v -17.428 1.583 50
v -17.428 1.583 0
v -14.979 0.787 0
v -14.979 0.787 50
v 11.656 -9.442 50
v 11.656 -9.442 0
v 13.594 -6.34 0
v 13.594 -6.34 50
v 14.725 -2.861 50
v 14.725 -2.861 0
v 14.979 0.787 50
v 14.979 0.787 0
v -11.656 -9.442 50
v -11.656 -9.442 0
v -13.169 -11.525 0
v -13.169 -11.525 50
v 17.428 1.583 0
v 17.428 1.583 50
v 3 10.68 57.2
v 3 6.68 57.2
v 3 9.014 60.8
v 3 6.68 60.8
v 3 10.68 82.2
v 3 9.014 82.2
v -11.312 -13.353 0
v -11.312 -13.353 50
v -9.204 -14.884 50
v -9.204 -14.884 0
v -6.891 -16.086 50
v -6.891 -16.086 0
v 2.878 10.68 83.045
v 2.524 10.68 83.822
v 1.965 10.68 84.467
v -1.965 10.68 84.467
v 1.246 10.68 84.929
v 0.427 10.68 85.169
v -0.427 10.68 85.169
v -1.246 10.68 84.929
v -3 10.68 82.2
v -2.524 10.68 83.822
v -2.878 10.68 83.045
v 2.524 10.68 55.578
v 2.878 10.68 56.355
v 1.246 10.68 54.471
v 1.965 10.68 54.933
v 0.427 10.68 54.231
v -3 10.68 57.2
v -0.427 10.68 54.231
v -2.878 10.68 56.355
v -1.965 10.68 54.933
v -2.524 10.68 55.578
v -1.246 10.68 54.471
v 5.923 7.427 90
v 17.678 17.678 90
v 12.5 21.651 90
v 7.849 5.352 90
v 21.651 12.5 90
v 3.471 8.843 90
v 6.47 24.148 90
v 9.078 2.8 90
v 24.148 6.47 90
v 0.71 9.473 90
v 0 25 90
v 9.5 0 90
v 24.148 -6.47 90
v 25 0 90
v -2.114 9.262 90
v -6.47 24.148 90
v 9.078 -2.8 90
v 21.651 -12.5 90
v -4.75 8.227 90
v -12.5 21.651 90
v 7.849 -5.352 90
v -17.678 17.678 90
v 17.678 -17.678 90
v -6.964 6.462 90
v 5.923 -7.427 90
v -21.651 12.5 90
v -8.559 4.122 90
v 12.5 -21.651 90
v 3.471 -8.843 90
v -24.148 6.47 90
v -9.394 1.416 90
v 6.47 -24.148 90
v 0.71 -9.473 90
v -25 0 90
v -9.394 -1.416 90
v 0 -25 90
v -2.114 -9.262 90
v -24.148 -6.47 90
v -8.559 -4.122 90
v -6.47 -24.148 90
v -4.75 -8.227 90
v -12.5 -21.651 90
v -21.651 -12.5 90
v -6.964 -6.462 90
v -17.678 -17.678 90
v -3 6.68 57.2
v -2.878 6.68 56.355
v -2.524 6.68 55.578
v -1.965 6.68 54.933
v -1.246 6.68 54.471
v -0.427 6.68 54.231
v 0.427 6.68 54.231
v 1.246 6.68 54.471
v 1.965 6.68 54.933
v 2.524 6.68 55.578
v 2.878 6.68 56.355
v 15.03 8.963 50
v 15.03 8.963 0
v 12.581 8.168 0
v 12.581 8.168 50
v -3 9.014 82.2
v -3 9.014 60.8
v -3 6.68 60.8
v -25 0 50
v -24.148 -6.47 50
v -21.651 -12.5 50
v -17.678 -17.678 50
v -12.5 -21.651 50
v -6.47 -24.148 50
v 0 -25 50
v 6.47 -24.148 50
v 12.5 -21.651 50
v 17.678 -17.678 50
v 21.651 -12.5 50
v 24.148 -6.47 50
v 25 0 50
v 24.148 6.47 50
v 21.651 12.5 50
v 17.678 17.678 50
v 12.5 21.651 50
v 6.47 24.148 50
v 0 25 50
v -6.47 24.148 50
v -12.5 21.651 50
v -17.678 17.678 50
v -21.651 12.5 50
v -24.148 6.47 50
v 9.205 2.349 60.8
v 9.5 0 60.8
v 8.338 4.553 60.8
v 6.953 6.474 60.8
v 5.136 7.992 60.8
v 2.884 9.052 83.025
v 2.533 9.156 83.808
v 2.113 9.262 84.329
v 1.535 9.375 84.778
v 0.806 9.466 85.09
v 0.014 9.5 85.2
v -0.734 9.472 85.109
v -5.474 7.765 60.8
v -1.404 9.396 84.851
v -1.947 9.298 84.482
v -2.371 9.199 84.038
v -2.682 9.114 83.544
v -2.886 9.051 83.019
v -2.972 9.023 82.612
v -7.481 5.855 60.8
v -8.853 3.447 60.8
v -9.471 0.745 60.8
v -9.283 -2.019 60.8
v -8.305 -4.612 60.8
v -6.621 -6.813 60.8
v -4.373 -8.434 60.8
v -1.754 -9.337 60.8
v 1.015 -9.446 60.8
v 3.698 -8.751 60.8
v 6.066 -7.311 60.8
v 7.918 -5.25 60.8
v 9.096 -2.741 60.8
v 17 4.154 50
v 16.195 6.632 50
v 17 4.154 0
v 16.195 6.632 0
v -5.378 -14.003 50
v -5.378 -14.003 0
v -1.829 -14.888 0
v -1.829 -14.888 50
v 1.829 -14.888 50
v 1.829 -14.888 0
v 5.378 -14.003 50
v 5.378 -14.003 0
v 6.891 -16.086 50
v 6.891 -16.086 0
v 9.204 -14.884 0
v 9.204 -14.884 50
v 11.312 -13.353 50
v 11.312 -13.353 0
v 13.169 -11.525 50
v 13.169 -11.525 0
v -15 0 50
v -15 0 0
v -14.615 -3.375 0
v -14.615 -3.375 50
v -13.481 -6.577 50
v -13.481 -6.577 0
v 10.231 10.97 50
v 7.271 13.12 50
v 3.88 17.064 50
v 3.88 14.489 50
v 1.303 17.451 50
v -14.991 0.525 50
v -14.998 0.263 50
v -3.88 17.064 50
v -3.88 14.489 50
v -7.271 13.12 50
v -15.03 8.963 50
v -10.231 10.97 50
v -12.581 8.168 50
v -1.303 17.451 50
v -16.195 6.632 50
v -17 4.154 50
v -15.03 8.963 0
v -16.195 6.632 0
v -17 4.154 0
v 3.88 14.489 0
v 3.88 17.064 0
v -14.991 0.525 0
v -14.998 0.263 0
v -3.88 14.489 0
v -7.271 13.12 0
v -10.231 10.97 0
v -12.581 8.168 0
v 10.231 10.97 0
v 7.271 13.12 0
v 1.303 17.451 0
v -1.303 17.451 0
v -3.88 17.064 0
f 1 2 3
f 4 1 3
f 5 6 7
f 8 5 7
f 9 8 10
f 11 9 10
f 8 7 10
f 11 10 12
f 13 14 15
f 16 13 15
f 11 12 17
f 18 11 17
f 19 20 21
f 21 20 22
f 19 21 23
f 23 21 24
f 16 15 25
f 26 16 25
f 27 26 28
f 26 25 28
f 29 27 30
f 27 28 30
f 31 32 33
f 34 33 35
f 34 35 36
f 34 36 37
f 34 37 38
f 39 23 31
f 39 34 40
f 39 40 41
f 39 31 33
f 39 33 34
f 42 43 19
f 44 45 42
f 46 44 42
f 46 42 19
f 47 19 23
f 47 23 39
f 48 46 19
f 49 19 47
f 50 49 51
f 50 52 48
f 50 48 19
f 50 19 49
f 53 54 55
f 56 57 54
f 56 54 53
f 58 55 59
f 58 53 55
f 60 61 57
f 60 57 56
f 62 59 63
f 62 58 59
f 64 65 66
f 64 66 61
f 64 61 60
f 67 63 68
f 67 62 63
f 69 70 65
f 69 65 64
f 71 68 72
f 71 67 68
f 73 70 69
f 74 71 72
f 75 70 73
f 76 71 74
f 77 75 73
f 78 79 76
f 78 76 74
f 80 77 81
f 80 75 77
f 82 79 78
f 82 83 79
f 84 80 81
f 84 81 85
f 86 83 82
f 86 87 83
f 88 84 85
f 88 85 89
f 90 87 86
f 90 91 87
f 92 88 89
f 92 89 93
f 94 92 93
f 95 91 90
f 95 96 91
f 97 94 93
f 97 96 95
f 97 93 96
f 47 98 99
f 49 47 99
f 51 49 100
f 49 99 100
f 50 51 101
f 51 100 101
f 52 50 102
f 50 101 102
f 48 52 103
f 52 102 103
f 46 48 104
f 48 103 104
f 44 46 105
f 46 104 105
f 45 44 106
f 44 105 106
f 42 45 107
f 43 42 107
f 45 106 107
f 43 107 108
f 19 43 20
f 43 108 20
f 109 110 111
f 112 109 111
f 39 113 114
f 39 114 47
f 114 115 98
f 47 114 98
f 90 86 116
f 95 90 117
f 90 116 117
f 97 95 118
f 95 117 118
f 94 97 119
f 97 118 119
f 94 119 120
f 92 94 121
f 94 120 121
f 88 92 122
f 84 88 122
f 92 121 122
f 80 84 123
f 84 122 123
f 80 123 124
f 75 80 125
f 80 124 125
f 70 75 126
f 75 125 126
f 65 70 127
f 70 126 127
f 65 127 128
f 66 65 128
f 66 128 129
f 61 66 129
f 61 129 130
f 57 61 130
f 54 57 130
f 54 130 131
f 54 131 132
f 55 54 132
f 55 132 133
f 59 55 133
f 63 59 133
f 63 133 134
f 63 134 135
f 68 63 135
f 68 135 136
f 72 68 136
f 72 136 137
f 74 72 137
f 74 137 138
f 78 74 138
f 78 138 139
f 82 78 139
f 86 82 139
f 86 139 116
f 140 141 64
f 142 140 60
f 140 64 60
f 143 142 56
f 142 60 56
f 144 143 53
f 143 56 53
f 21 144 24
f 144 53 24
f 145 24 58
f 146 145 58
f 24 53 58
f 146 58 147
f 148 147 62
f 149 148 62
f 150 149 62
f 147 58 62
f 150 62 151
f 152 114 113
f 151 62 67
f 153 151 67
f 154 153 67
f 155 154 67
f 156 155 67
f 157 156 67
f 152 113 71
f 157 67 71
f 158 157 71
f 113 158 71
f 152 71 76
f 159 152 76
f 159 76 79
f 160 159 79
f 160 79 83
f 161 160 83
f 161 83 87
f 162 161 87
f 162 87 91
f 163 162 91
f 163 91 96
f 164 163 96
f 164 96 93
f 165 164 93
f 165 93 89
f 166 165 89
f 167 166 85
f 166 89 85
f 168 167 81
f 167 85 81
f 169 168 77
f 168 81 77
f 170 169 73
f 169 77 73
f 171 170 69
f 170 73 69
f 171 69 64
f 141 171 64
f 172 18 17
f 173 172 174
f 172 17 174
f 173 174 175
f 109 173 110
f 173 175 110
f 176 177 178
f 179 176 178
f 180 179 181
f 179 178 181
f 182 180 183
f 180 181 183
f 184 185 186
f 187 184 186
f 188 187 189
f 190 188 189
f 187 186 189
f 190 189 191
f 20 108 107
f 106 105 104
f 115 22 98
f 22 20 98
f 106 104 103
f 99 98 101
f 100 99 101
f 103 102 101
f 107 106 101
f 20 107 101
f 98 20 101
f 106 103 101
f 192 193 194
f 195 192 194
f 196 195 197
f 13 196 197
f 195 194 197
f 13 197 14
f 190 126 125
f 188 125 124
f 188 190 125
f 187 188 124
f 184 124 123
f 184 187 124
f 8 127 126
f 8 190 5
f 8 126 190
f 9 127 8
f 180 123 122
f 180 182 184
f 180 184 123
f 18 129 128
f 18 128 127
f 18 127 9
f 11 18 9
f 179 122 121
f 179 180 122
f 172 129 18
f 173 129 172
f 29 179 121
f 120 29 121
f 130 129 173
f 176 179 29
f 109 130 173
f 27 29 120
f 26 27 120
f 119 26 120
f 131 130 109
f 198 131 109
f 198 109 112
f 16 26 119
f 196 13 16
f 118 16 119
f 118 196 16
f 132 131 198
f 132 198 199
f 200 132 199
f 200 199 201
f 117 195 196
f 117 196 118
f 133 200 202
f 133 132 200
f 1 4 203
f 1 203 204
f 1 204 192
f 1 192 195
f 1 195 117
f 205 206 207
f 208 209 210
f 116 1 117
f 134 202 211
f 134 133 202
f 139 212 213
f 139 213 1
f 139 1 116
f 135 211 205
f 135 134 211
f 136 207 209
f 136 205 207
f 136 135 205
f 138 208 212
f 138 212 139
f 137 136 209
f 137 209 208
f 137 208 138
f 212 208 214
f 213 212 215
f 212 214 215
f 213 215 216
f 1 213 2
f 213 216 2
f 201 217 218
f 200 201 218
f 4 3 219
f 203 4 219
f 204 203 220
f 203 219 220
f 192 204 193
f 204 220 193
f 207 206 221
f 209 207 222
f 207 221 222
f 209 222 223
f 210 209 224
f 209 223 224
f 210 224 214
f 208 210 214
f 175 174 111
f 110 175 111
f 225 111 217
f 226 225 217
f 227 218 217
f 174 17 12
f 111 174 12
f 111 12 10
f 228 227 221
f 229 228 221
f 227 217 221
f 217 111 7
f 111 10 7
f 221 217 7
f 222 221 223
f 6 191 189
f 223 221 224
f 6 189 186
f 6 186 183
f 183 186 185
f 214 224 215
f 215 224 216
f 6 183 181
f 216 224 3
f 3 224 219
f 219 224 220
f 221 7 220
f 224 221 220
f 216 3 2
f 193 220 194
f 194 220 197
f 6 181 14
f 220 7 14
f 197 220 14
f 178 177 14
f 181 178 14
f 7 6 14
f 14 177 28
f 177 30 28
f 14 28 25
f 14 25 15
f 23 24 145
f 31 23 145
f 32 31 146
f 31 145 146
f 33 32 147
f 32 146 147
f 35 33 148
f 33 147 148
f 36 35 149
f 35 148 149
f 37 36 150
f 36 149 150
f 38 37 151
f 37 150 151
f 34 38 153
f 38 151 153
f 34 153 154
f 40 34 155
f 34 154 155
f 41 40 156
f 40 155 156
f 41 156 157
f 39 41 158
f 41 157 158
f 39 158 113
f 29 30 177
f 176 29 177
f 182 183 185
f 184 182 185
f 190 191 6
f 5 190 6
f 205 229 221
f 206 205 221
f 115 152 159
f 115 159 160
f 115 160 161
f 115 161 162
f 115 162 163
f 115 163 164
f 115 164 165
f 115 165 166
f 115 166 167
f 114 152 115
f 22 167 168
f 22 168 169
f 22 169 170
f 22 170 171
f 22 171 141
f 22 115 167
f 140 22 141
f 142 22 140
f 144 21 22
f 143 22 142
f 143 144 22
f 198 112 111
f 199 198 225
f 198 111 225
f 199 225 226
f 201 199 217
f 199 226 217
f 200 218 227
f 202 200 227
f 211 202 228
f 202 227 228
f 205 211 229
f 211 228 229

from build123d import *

# Parameters (mm, degrees)
SKETCH1_R           = 25
BOSS_EXTRUDE1_DEPTH = 90
SKETCH2_R           = 25
CUT_EXTRUDE2_DEPTH  = 50
CUT_EXTRUDE4_DEPTH  = 50
SKETCH3_R           = 9.5
CUT_EXTRUDE5_DEPTH  = 29.2
CUT_EXTRUDE6_DEPTH  = 4


with BuildPart() as part:
    # Sketch1 → Boss-Extrude1 (new body)
    with BuildSketch(Plane.XY):
        Circle(SKETCH1_R)
    extrude(amount=BOSS_EXTRUDE1_DEPTH)

    # Sketch2 → Cut-Extrude2 (cut)
    with BuildSketch(Plane(origin=(0, 0, 0), x_dir=(-1, 0, 0), z_dir=(0, 0, -1))):
        Circle(SKETCH2_R)
        with BuildLine():
            ThreePointArc((3.88, 17.064454284), (10.286241915, 14.157797402), (15.030274505, 8.963305657))
            ThreePointArc((15.030274505, 8.963305657), (16.643489035, 5.407797402), (17.428246382, 1.58310709))
            ThreePointArc((17.428246382, 1.58310709), (17.482052392, 0.792366178), (17.5, 0))
            ThreePointArc((17.5, 0), (16.381565231, -6.155836303), (13.169220505, -11.524826736))
            ThreePointArc((13.169220505, -11.524826736), (10.286241915, -14.157797402), (6.891248628, -16.086040294))
            ThreePointArc((6.891248628, -16.086040294), (0, -17.5), (-6.891248628, -16.086040294))
            ThreePointArc((-6.891248628, -16.086040294), (-10.286241915, -14.157797402), (-13.169220505, -11.524826736))
            ThreePointArc((-13.169220505, -11.524826736), (-16.643489035, -5.407797402), (-17.428246382, 1.58310709))
            ThreePointArc((-17.428246382, 1.58310709), (-16.643489035, 5.407797402), (-15.030274505, 8.963305657))
            ThreePointArc((-15.030274505, 8.963305657), (-10.286241915, 14.157797402), (-3.88, 17.064454284))
            ThreePointArc((-3.88, 17.064454284), (0, 17.5), (3.88, 17.064454284))
        make_face(mode=Mode.SUBTRACT)
    extrude(amount=-CUT_EXTRUDE2_DEPTH, mode=Mode.SUBTRACT)

    # Sketch2<3> → Cut-Extrude4 (cut)
    with BuildSketch(Plane(origin=(0, 0, 0), x_dir=(-1, 0, 0), z_dir=(0, 0, -1))):
        with BuildLine():
            ThreePointArc((3.88, 14.489499646), (8.816778784, 12.135254916), (12.581347118, 8.167600914))
            Line((12.581347118, 8.167600914), (15.030274505, 8.963305657))
            ThreePointArc((15.030274505, 8.963305657), (10.286241915, 14.157797402), (3.88, 17.064454284))
            Line((3.88, 17.064454284), (3.88, 14.489499646))
        make_face()
        with BuildLine():
            Line((17.428246382, 1.58310709), (14.979318995, 0.787402347))
            ThreePointArc((14.979318995, 0.787402347), (14.265847744, -4.635254916), (11.655700143, -9.441644675))
            Line((11.655700143, -9.441644675), (13.169220505, -11.524826736))
            ThreePointArc((13.169220505, -11.524826736), (16.643489035, -5.407797402), (17.428246382, 1.58310709))
        make_face()
        with BuildLine():
            Line((-3.88, 14.489499646), (-3.88, 17.064454284))
            ThreePointArc((-3.88, 17.064454284), (-10.286241915, 14.157797402), (-15.030274505, 8.963305657))
            Line((-15.030274505, 8.963305657), (-12.581347118, 8.167600914))
            ThreePointArc((-12.581347118, 8.167600914), (-8.816778784, 12.135254916), (-3.88, 14.489499646))
        make_face()
        with BuildLine():
            Line((6.891248628, -16.086040294), (5.377728267, -14.002858233))
            ThreePointArc((5.377728267, -14.002858233), (0, -15), (-5.377728267, -14.002858233))
            Line((-5.377728267, -14.002858233), (-6.891248628, -16.086040294))
            ThreePointArc((-6.891248628, -16.086040294), (0, -17.5), (6.891248628, -16.086040294))
        make_face()
        with BuildLine():
            Line((-14.979318995, 0.787402347), (-17.428246382, 1.58310709))
            ThreePointArc((-17.428246382, 1.58310709), (-16.643489035, -5.407797402), (-13.169220505, -11.524826736))
            Line((-13.169220505, -11.524826736), (-11.655700143, -9.441644675))
            ThreePointArc((-11.655700143, -9.441644675), (-14.265847744, -4.635254916), (-14.979318995, 0.787402347))
        make_face()
    extrude(amount=-CUT_EXTRUDE4_DEPTH, mode=Mode.SUBTRACT)

    # Sketch3 → Cut-Extrude5 (cut)
    with BuildSketch(Plane.XY.offset(90)):
        Circle(SKETCH3_R)
    extrude(amount=-CUT_EXTRUDE5_DEPTH, mode=Mode.SUBTRACT)

    # Sketch5 → Cut-Extrude6 (cut)
    with BuildSketch(Plane(origin=(0, 6.68, 0), x_dir=(1, 0, 0), z_dir=(0, 1, 0))):
        with BuildLine():
            Line((-3, -82.2), (-3, -57.2))
            ThreePointArc((-3, -57.2), (0, -54.2), (3, -57.2))
            Line((3, -57.2), (3, -82.2))
            ThreePointArc((3, -82.2), (0, -85.2), (-3, -82.2))
        make_face()
    extrude(amount=CUT_EXTRUDE6_DEPTH, mode=Mode.SUBTRACT)


solid = part.part
